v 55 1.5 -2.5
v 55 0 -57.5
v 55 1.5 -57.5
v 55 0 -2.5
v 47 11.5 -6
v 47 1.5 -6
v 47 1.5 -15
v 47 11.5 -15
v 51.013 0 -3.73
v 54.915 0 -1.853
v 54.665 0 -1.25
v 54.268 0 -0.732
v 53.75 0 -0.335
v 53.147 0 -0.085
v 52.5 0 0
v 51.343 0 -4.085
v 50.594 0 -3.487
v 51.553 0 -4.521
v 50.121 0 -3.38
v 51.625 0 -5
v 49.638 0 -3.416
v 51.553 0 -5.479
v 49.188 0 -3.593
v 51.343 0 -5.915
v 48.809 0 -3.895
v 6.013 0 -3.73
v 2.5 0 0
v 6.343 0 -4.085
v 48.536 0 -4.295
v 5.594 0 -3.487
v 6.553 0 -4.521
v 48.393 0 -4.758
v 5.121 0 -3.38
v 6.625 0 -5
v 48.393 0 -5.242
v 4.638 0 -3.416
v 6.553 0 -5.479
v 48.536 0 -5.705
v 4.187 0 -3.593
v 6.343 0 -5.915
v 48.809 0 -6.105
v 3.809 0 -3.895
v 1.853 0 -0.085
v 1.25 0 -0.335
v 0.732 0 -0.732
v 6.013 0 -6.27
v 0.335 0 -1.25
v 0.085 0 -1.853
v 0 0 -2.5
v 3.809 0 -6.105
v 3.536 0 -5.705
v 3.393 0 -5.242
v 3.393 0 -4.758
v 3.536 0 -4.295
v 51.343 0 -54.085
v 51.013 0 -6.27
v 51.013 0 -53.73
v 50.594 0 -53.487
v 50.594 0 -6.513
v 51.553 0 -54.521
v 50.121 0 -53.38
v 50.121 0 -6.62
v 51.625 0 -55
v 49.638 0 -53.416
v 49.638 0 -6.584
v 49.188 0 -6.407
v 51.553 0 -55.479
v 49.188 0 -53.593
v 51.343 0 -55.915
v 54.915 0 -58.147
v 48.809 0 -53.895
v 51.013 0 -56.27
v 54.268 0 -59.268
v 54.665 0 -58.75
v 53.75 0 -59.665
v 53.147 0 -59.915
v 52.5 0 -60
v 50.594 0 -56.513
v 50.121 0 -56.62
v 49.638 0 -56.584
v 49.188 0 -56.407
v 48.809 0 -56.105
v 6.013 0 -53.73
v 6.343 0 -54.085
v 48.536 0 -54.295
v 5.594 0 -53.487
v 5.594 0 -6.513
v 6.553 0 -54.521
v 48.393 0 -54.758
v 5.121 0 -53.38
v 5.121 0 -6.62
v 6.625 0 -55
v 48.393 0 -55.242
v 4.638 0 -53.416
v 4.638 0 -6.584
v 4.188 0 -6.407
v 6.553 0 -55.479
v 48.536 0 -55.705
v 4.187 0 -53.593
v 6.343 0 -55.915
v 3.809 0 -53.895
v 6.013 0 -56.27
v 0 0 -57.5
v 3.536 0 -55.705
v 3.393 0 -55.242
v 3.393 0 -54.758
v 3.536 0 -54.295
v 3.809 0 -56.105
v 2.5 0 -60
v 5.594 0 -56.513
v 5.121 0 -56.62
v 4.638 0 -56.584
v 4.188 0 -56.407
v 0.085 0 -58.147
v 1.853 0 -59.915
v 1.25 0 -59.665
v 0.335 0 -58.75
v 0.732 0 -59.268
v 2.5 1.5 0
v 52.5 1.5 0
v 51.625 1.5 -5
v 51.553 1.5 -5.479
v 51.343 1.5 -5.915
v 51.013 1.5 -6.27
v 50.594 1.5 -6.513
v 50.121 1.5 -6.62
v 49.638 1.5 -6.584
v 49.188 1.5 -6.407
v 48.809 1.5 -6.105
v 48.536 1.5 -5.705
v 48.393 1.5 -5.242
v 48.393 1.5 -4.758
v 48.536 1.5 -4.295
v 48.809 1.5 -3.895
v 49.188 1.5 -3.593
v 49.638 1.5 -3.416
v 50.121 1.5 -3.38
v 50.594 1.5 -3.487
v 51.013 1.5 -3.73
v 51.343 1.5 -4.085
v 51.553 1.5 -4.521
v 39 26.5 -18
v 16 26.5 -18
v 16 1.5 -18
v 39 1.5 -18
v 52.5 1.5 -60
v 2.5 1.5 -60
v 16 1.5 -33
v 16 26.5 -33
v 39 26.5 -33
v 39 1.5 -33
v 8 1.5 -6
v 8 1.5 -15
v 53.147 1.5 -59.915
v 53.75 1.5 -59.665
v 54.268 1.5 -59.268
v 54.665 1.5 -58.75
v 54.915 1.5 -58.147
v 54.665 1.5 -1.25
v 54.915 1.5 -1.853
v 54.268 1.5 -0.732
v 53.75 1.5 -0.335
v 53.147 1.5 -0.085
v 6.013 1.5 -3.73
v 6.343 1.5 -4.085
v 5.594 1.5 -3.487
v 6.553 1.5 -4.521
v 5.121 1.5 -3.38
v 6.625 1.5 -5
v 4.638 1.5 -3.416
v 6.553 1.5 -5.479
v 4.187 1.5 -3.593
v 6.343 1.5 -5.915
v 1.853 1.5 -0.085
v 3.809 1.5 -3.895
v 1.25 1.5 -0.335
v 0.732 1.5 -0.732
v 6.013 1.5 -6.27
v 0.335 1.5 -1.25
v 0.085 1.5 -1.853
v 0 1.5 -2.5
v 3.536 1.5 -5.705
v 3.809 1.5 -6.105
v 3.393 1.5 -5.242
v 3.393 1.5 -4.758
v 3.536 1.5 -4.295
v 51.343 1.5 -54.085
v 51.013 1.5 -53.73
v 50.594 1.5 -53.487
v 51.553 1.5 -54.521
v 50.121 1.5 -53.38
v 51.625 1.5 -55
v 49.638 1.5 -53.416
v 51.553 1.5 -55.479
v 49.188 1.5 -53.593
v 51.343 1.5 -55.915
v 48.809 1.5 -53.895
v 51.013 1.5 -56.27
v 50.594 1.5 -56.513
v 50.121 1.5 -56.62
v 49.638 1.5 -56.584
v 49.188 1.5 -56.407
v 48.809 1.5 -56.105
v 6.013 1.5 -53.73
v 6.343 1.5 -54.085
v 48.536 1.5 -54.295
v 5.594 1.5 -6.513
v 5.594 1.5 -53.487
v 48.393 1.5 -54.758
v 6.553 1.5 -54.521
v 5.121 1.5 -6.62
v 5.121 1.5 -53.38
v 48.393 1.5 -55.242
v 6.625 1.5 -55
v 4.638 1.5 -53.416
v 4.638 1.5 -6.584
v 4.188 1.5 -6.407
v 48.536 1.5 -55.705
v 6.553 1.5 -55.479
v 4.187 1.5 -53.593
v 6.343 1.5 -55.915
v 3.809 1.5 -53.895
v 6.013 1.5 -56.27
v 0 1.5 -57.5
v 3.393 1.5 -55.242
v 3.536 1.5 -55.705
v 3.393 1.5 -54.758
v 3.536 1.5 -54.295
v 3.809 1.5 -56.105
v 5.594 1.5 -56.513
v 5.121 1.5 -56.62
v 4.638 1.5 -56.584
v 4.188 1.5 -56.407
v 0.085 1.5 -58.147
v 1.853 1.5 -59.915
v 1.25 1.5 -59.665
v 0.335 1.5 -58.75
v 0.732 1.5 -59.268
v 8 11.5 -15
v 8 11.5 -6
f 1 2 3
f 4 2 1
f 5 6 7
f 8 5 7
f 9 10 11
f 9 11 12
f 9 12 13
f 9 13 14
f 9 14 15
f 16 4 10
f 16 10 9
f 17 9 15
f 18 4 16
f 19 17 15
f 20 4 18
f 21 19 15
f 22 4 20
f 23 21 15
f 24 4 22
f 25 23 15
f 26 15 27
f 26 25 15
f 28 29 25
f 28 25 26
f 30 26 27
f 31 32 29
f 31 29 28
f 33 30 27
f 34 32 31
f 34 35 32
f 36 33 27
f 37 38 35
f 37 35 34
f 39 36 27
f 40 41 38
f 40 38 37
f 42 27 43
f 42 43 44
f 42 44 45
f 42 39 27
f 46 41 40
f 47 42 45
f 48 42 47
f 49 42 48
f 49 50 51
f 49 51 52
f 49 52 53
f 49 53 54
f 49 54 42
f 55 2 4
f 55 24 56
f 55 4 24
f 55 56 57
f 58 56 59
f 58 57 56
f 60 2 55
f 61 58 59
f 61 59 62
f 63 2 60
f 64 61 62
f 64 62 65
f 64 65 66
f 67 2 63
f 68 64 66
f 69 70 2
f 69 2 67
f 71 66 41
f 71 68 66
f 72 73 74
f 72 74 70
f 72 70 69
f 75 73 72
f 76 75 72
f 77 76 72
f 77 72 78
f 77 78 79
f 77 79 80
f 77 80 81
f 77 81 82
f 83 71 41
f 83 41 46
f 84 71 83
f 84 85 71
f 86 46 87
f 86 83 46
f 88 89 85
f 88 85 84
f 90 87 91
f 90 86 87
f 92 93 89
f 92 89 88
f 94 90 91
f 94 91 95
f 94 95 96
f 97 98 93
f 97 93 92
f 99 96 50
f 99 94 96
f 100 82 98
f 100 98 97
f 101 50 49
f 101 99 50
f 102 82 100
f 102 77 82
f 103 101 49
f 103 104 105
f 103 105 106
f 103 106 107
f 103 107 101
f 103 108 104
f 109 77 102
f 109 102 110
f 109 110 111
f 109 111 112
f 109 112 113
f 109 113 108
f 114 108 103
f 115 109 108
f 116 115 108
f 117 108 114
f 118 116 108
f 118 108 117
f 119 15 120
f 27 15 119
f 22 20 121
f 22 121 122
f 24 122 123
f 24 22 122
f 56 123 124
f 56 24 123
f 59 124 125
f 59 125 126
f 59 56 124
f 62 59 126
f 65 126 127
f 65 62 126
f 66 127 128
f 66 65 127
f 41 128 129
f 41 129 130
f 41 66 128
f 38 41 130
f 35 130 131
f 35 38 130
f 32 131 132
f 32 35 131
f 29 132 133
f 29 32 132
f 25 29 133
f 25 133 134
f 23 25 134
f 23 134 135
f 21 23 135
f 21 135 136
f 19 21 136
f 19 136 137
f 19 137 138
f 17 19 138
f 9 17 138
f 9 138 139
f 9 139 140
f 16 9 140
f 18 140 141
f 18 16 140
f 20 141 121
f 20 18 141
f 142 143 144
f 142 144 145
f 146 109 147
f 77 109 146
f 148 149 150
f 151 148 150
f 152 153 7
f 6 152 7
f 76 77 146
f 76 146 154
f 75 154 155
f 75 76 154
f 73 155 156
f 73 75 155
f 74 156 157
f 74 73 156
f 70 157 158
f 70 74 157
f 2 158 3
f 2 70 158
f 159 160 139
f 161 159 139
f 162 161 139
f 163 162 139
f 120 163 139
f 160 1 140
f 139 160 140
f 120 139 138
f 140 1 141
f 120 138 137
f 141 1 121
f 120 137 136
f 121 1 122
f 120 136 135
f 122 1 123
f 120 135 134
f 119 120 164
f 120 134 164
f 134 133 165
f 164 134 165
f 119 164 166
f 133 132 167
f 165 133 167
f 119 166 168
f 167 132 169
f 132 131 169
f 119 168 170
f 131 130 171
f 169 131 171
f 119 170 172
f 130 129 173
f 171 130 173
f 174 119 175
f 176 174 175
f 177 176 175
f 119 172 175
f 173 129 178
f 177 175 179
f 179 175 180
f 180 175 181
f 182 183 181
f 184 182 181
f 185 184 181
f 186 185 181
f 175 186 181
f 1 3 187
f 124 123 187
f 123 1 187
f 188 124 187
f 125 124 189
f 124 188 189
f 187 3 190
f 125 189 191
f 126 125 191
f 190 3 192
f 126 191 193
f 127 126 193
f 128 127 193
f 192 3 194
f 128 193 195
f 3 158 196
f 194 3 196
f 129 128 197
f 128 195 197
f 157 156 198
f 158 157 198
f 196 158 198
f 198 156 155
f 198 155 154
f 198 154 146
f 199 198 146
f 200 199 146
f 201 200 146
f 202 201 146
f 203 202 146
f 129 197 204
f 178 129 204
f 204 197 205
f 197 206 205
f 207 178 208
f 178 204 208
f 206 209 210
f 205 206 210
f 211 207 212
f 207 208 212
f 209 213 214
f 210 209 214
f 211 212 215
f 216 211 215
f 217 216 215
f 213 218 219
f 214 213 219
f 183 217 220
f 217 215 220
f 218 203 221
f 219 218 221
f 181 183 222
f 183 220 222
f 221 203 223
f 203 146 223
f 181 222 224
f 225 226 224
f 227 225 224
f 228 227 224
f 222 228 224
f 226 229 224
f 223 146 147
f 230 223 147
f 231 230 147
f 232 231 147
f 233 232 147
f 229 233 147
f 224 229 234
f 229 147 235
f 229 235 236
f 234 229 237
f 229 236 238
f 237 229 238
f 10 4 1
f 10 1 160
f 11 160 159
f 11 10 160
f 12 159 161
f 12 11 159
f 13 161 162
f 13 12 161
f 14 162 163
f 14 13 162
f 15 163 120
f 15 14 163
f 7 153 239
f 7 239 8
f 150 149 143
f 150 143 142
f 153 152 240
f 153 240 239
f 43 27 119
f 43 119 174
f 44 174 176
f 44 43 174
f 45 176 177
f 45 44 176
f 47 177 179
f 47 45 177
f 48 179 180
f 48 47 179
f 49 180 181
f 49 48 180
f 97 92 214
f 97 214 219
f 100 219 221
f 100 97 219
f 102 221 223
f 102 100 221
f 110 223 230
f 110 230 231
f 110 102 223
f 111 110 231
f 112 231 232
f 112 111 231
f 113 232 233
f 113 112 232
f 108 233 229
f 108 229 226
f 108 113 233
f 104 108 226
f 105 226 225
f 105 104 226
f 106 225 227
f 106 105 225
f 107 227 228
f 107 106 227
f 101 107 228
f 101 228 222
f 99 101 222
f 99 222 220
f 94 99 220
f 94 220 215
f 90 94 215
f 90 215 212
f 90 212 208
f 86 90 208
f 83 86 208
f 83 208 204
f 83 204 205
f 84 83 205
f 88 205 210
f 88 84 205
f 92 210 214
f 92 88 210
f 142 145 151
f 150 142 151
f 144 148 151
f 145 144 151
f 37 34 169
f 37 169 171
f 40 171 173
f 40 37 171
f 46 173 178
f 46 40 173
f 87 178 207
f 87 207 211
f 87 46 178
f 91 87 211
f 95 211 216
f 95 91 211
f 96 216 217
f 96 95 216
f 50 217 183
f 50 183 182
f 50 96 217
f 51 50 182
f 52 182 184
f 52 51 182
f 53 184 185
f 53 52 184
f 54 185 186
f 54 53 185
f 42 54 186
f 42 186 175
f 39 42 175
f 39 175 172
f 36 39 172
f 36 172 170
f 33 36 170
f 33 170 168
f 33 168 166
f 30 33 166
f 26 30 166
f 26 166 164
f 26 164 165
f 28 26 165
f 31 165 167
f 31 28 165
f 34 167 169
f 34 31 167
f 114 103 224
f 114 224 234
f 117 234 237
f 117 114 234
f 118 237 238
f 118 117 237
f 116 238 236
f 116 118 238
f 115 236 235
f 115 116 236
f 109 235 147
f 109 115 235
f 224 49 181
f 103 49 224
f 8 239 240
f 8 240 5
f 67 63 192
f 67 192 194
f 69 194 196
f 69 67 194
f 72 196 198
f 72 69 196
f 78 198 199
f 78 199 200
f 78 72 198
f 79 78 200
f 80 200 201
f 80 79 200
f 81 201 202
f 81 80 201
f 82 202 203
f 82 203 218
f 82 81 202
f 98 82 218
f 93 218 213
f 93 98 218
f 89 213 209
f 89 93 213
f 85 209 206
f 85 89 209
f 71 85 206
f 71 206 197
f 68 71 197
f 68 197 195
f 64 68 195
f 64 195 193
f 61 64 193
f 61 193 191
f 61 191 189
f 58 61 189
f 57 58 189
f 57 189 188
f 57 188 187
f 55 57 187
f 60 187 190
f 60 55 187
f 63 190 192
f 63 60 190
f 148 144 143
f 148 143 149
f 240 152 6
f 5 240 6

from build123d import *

# Parameters (mm, degrees)
SKETCH1_R           = 1.625
SKETCH1_W           = 23
SKETCH1_H           = 15
SKETCH1_W_2         = 39
SKETCH1_H_2         = 9
BOSS_EXTRUDE1_DEPTH = 1.5
BOSS_EXTRUDE2_START = 1.5
SKETCH1_4_W         = 39
SKETCH1_4_H         = 9
BOSS_EXTRUDE2_DEPTH = 10
BOSS_EXTRUDE3_START = 1.5
SKETCH1_5_W         = 23
SKETCH1_5_H         = 15
BOSS_EXTRUDE3_DEPTH = 25


with BuildPart() as part:
    # Sketch1 → Boss-Extrude1 (new body)
    with BuildSketch(Plane(origin=(0, 0, 0), x_dir=(1, 0, 0), z_dir=(0, 1, 0))):
        with BuildLine():
            ThreePointArc((0, 57.5), (0.732233047, 59.267766953), (2.5, 60))
            Line((2.5, 60), (52.5, 60))
            ThreePointArc((52.5, 60), (54.267766953, 59.267766953), (55, 57.5))
            Line((55, 57.5), (55, 2.5))
            ThreePointArc((55, 2.5), (54.267766953, 0.732233047), (52.5, 0))
            Line((52.5, 0), (2.5, 0))
            ThreePointArc((2.5, 0), (0.732233047, 0.732233047), (0, 2.5))
            Line((0, 2.5), (0, 57.5))
        make_face()
        with Locations((50, 5)):
            Circle(SKETCH1_R, mode=Mode.SUBTRACT)
        with Locations((5, 5)):
            Circle(SKETCH1_R, mode=Mode.SUBTRACT)
        with Locations((50, 55)):
            Circle(SKETCH1_R, mode=Mode.SUBTRACT)
        with Locations((5, 55)):
            Circle(SKETCH1_R, mode=Mode.SUBTRACT)
        with Locations((27.5, 25.5)):
            Rectangle(SKETCH1_W, SKETCH1_H, mode=Mode.SUBTRACT)
        with Locations((27.5, 10.5)):
            Rectangle(SKETCH1_W_2, SKETCH1_H_2, mode=Mode.SUBTRACT)
        with Locations((27.5, 25.5)):
            Rectangle(SKETCH1_W, SKETCH1_H)
        with Locations((27.5, 10.5)):
            Rectangle(SKETCH1_W_2, SKETCH1_H_2)
    extrude(amount=BOSS_EXTRUDE1_DEPTH)


with BuildPart() as body_2:
    # Sketch1<4> → Boss-Extrude2 (new body)
    with BuildSketch(Plane(origin=(0, 0, 0), x_dir=(1, 0, 0), z_dir=(0, 1, 0)).offset(BOSS_EXTRUDE2_START)):
        with Locations((27.5, 10.5)):
            Rectangle(SKETCH1_4_W, SKETCH1_4_H)
    extrude(amount=BOSS_EXTRUDE2_DEPTH)


with BuildPart() as body_3:
    # Sketch1<5> → Boss-Extrude3 (new body)
    with BuildSketch(Plane(origin=(0, 0, 0), x_dir=(1, 0, 0), z_dir=(0, 1, 0)).offset(BOSS_EXTRUDE3_START)):
        with Locations((27.5, 25.5)):
            Rectangle(SKETCH1_5_W, SKETCH1_5_H)
    extrude(amount=BOSS_EXTRUDE3_DEPTH)


solid = Compound([part.part, body_2.part, body_3.part])
